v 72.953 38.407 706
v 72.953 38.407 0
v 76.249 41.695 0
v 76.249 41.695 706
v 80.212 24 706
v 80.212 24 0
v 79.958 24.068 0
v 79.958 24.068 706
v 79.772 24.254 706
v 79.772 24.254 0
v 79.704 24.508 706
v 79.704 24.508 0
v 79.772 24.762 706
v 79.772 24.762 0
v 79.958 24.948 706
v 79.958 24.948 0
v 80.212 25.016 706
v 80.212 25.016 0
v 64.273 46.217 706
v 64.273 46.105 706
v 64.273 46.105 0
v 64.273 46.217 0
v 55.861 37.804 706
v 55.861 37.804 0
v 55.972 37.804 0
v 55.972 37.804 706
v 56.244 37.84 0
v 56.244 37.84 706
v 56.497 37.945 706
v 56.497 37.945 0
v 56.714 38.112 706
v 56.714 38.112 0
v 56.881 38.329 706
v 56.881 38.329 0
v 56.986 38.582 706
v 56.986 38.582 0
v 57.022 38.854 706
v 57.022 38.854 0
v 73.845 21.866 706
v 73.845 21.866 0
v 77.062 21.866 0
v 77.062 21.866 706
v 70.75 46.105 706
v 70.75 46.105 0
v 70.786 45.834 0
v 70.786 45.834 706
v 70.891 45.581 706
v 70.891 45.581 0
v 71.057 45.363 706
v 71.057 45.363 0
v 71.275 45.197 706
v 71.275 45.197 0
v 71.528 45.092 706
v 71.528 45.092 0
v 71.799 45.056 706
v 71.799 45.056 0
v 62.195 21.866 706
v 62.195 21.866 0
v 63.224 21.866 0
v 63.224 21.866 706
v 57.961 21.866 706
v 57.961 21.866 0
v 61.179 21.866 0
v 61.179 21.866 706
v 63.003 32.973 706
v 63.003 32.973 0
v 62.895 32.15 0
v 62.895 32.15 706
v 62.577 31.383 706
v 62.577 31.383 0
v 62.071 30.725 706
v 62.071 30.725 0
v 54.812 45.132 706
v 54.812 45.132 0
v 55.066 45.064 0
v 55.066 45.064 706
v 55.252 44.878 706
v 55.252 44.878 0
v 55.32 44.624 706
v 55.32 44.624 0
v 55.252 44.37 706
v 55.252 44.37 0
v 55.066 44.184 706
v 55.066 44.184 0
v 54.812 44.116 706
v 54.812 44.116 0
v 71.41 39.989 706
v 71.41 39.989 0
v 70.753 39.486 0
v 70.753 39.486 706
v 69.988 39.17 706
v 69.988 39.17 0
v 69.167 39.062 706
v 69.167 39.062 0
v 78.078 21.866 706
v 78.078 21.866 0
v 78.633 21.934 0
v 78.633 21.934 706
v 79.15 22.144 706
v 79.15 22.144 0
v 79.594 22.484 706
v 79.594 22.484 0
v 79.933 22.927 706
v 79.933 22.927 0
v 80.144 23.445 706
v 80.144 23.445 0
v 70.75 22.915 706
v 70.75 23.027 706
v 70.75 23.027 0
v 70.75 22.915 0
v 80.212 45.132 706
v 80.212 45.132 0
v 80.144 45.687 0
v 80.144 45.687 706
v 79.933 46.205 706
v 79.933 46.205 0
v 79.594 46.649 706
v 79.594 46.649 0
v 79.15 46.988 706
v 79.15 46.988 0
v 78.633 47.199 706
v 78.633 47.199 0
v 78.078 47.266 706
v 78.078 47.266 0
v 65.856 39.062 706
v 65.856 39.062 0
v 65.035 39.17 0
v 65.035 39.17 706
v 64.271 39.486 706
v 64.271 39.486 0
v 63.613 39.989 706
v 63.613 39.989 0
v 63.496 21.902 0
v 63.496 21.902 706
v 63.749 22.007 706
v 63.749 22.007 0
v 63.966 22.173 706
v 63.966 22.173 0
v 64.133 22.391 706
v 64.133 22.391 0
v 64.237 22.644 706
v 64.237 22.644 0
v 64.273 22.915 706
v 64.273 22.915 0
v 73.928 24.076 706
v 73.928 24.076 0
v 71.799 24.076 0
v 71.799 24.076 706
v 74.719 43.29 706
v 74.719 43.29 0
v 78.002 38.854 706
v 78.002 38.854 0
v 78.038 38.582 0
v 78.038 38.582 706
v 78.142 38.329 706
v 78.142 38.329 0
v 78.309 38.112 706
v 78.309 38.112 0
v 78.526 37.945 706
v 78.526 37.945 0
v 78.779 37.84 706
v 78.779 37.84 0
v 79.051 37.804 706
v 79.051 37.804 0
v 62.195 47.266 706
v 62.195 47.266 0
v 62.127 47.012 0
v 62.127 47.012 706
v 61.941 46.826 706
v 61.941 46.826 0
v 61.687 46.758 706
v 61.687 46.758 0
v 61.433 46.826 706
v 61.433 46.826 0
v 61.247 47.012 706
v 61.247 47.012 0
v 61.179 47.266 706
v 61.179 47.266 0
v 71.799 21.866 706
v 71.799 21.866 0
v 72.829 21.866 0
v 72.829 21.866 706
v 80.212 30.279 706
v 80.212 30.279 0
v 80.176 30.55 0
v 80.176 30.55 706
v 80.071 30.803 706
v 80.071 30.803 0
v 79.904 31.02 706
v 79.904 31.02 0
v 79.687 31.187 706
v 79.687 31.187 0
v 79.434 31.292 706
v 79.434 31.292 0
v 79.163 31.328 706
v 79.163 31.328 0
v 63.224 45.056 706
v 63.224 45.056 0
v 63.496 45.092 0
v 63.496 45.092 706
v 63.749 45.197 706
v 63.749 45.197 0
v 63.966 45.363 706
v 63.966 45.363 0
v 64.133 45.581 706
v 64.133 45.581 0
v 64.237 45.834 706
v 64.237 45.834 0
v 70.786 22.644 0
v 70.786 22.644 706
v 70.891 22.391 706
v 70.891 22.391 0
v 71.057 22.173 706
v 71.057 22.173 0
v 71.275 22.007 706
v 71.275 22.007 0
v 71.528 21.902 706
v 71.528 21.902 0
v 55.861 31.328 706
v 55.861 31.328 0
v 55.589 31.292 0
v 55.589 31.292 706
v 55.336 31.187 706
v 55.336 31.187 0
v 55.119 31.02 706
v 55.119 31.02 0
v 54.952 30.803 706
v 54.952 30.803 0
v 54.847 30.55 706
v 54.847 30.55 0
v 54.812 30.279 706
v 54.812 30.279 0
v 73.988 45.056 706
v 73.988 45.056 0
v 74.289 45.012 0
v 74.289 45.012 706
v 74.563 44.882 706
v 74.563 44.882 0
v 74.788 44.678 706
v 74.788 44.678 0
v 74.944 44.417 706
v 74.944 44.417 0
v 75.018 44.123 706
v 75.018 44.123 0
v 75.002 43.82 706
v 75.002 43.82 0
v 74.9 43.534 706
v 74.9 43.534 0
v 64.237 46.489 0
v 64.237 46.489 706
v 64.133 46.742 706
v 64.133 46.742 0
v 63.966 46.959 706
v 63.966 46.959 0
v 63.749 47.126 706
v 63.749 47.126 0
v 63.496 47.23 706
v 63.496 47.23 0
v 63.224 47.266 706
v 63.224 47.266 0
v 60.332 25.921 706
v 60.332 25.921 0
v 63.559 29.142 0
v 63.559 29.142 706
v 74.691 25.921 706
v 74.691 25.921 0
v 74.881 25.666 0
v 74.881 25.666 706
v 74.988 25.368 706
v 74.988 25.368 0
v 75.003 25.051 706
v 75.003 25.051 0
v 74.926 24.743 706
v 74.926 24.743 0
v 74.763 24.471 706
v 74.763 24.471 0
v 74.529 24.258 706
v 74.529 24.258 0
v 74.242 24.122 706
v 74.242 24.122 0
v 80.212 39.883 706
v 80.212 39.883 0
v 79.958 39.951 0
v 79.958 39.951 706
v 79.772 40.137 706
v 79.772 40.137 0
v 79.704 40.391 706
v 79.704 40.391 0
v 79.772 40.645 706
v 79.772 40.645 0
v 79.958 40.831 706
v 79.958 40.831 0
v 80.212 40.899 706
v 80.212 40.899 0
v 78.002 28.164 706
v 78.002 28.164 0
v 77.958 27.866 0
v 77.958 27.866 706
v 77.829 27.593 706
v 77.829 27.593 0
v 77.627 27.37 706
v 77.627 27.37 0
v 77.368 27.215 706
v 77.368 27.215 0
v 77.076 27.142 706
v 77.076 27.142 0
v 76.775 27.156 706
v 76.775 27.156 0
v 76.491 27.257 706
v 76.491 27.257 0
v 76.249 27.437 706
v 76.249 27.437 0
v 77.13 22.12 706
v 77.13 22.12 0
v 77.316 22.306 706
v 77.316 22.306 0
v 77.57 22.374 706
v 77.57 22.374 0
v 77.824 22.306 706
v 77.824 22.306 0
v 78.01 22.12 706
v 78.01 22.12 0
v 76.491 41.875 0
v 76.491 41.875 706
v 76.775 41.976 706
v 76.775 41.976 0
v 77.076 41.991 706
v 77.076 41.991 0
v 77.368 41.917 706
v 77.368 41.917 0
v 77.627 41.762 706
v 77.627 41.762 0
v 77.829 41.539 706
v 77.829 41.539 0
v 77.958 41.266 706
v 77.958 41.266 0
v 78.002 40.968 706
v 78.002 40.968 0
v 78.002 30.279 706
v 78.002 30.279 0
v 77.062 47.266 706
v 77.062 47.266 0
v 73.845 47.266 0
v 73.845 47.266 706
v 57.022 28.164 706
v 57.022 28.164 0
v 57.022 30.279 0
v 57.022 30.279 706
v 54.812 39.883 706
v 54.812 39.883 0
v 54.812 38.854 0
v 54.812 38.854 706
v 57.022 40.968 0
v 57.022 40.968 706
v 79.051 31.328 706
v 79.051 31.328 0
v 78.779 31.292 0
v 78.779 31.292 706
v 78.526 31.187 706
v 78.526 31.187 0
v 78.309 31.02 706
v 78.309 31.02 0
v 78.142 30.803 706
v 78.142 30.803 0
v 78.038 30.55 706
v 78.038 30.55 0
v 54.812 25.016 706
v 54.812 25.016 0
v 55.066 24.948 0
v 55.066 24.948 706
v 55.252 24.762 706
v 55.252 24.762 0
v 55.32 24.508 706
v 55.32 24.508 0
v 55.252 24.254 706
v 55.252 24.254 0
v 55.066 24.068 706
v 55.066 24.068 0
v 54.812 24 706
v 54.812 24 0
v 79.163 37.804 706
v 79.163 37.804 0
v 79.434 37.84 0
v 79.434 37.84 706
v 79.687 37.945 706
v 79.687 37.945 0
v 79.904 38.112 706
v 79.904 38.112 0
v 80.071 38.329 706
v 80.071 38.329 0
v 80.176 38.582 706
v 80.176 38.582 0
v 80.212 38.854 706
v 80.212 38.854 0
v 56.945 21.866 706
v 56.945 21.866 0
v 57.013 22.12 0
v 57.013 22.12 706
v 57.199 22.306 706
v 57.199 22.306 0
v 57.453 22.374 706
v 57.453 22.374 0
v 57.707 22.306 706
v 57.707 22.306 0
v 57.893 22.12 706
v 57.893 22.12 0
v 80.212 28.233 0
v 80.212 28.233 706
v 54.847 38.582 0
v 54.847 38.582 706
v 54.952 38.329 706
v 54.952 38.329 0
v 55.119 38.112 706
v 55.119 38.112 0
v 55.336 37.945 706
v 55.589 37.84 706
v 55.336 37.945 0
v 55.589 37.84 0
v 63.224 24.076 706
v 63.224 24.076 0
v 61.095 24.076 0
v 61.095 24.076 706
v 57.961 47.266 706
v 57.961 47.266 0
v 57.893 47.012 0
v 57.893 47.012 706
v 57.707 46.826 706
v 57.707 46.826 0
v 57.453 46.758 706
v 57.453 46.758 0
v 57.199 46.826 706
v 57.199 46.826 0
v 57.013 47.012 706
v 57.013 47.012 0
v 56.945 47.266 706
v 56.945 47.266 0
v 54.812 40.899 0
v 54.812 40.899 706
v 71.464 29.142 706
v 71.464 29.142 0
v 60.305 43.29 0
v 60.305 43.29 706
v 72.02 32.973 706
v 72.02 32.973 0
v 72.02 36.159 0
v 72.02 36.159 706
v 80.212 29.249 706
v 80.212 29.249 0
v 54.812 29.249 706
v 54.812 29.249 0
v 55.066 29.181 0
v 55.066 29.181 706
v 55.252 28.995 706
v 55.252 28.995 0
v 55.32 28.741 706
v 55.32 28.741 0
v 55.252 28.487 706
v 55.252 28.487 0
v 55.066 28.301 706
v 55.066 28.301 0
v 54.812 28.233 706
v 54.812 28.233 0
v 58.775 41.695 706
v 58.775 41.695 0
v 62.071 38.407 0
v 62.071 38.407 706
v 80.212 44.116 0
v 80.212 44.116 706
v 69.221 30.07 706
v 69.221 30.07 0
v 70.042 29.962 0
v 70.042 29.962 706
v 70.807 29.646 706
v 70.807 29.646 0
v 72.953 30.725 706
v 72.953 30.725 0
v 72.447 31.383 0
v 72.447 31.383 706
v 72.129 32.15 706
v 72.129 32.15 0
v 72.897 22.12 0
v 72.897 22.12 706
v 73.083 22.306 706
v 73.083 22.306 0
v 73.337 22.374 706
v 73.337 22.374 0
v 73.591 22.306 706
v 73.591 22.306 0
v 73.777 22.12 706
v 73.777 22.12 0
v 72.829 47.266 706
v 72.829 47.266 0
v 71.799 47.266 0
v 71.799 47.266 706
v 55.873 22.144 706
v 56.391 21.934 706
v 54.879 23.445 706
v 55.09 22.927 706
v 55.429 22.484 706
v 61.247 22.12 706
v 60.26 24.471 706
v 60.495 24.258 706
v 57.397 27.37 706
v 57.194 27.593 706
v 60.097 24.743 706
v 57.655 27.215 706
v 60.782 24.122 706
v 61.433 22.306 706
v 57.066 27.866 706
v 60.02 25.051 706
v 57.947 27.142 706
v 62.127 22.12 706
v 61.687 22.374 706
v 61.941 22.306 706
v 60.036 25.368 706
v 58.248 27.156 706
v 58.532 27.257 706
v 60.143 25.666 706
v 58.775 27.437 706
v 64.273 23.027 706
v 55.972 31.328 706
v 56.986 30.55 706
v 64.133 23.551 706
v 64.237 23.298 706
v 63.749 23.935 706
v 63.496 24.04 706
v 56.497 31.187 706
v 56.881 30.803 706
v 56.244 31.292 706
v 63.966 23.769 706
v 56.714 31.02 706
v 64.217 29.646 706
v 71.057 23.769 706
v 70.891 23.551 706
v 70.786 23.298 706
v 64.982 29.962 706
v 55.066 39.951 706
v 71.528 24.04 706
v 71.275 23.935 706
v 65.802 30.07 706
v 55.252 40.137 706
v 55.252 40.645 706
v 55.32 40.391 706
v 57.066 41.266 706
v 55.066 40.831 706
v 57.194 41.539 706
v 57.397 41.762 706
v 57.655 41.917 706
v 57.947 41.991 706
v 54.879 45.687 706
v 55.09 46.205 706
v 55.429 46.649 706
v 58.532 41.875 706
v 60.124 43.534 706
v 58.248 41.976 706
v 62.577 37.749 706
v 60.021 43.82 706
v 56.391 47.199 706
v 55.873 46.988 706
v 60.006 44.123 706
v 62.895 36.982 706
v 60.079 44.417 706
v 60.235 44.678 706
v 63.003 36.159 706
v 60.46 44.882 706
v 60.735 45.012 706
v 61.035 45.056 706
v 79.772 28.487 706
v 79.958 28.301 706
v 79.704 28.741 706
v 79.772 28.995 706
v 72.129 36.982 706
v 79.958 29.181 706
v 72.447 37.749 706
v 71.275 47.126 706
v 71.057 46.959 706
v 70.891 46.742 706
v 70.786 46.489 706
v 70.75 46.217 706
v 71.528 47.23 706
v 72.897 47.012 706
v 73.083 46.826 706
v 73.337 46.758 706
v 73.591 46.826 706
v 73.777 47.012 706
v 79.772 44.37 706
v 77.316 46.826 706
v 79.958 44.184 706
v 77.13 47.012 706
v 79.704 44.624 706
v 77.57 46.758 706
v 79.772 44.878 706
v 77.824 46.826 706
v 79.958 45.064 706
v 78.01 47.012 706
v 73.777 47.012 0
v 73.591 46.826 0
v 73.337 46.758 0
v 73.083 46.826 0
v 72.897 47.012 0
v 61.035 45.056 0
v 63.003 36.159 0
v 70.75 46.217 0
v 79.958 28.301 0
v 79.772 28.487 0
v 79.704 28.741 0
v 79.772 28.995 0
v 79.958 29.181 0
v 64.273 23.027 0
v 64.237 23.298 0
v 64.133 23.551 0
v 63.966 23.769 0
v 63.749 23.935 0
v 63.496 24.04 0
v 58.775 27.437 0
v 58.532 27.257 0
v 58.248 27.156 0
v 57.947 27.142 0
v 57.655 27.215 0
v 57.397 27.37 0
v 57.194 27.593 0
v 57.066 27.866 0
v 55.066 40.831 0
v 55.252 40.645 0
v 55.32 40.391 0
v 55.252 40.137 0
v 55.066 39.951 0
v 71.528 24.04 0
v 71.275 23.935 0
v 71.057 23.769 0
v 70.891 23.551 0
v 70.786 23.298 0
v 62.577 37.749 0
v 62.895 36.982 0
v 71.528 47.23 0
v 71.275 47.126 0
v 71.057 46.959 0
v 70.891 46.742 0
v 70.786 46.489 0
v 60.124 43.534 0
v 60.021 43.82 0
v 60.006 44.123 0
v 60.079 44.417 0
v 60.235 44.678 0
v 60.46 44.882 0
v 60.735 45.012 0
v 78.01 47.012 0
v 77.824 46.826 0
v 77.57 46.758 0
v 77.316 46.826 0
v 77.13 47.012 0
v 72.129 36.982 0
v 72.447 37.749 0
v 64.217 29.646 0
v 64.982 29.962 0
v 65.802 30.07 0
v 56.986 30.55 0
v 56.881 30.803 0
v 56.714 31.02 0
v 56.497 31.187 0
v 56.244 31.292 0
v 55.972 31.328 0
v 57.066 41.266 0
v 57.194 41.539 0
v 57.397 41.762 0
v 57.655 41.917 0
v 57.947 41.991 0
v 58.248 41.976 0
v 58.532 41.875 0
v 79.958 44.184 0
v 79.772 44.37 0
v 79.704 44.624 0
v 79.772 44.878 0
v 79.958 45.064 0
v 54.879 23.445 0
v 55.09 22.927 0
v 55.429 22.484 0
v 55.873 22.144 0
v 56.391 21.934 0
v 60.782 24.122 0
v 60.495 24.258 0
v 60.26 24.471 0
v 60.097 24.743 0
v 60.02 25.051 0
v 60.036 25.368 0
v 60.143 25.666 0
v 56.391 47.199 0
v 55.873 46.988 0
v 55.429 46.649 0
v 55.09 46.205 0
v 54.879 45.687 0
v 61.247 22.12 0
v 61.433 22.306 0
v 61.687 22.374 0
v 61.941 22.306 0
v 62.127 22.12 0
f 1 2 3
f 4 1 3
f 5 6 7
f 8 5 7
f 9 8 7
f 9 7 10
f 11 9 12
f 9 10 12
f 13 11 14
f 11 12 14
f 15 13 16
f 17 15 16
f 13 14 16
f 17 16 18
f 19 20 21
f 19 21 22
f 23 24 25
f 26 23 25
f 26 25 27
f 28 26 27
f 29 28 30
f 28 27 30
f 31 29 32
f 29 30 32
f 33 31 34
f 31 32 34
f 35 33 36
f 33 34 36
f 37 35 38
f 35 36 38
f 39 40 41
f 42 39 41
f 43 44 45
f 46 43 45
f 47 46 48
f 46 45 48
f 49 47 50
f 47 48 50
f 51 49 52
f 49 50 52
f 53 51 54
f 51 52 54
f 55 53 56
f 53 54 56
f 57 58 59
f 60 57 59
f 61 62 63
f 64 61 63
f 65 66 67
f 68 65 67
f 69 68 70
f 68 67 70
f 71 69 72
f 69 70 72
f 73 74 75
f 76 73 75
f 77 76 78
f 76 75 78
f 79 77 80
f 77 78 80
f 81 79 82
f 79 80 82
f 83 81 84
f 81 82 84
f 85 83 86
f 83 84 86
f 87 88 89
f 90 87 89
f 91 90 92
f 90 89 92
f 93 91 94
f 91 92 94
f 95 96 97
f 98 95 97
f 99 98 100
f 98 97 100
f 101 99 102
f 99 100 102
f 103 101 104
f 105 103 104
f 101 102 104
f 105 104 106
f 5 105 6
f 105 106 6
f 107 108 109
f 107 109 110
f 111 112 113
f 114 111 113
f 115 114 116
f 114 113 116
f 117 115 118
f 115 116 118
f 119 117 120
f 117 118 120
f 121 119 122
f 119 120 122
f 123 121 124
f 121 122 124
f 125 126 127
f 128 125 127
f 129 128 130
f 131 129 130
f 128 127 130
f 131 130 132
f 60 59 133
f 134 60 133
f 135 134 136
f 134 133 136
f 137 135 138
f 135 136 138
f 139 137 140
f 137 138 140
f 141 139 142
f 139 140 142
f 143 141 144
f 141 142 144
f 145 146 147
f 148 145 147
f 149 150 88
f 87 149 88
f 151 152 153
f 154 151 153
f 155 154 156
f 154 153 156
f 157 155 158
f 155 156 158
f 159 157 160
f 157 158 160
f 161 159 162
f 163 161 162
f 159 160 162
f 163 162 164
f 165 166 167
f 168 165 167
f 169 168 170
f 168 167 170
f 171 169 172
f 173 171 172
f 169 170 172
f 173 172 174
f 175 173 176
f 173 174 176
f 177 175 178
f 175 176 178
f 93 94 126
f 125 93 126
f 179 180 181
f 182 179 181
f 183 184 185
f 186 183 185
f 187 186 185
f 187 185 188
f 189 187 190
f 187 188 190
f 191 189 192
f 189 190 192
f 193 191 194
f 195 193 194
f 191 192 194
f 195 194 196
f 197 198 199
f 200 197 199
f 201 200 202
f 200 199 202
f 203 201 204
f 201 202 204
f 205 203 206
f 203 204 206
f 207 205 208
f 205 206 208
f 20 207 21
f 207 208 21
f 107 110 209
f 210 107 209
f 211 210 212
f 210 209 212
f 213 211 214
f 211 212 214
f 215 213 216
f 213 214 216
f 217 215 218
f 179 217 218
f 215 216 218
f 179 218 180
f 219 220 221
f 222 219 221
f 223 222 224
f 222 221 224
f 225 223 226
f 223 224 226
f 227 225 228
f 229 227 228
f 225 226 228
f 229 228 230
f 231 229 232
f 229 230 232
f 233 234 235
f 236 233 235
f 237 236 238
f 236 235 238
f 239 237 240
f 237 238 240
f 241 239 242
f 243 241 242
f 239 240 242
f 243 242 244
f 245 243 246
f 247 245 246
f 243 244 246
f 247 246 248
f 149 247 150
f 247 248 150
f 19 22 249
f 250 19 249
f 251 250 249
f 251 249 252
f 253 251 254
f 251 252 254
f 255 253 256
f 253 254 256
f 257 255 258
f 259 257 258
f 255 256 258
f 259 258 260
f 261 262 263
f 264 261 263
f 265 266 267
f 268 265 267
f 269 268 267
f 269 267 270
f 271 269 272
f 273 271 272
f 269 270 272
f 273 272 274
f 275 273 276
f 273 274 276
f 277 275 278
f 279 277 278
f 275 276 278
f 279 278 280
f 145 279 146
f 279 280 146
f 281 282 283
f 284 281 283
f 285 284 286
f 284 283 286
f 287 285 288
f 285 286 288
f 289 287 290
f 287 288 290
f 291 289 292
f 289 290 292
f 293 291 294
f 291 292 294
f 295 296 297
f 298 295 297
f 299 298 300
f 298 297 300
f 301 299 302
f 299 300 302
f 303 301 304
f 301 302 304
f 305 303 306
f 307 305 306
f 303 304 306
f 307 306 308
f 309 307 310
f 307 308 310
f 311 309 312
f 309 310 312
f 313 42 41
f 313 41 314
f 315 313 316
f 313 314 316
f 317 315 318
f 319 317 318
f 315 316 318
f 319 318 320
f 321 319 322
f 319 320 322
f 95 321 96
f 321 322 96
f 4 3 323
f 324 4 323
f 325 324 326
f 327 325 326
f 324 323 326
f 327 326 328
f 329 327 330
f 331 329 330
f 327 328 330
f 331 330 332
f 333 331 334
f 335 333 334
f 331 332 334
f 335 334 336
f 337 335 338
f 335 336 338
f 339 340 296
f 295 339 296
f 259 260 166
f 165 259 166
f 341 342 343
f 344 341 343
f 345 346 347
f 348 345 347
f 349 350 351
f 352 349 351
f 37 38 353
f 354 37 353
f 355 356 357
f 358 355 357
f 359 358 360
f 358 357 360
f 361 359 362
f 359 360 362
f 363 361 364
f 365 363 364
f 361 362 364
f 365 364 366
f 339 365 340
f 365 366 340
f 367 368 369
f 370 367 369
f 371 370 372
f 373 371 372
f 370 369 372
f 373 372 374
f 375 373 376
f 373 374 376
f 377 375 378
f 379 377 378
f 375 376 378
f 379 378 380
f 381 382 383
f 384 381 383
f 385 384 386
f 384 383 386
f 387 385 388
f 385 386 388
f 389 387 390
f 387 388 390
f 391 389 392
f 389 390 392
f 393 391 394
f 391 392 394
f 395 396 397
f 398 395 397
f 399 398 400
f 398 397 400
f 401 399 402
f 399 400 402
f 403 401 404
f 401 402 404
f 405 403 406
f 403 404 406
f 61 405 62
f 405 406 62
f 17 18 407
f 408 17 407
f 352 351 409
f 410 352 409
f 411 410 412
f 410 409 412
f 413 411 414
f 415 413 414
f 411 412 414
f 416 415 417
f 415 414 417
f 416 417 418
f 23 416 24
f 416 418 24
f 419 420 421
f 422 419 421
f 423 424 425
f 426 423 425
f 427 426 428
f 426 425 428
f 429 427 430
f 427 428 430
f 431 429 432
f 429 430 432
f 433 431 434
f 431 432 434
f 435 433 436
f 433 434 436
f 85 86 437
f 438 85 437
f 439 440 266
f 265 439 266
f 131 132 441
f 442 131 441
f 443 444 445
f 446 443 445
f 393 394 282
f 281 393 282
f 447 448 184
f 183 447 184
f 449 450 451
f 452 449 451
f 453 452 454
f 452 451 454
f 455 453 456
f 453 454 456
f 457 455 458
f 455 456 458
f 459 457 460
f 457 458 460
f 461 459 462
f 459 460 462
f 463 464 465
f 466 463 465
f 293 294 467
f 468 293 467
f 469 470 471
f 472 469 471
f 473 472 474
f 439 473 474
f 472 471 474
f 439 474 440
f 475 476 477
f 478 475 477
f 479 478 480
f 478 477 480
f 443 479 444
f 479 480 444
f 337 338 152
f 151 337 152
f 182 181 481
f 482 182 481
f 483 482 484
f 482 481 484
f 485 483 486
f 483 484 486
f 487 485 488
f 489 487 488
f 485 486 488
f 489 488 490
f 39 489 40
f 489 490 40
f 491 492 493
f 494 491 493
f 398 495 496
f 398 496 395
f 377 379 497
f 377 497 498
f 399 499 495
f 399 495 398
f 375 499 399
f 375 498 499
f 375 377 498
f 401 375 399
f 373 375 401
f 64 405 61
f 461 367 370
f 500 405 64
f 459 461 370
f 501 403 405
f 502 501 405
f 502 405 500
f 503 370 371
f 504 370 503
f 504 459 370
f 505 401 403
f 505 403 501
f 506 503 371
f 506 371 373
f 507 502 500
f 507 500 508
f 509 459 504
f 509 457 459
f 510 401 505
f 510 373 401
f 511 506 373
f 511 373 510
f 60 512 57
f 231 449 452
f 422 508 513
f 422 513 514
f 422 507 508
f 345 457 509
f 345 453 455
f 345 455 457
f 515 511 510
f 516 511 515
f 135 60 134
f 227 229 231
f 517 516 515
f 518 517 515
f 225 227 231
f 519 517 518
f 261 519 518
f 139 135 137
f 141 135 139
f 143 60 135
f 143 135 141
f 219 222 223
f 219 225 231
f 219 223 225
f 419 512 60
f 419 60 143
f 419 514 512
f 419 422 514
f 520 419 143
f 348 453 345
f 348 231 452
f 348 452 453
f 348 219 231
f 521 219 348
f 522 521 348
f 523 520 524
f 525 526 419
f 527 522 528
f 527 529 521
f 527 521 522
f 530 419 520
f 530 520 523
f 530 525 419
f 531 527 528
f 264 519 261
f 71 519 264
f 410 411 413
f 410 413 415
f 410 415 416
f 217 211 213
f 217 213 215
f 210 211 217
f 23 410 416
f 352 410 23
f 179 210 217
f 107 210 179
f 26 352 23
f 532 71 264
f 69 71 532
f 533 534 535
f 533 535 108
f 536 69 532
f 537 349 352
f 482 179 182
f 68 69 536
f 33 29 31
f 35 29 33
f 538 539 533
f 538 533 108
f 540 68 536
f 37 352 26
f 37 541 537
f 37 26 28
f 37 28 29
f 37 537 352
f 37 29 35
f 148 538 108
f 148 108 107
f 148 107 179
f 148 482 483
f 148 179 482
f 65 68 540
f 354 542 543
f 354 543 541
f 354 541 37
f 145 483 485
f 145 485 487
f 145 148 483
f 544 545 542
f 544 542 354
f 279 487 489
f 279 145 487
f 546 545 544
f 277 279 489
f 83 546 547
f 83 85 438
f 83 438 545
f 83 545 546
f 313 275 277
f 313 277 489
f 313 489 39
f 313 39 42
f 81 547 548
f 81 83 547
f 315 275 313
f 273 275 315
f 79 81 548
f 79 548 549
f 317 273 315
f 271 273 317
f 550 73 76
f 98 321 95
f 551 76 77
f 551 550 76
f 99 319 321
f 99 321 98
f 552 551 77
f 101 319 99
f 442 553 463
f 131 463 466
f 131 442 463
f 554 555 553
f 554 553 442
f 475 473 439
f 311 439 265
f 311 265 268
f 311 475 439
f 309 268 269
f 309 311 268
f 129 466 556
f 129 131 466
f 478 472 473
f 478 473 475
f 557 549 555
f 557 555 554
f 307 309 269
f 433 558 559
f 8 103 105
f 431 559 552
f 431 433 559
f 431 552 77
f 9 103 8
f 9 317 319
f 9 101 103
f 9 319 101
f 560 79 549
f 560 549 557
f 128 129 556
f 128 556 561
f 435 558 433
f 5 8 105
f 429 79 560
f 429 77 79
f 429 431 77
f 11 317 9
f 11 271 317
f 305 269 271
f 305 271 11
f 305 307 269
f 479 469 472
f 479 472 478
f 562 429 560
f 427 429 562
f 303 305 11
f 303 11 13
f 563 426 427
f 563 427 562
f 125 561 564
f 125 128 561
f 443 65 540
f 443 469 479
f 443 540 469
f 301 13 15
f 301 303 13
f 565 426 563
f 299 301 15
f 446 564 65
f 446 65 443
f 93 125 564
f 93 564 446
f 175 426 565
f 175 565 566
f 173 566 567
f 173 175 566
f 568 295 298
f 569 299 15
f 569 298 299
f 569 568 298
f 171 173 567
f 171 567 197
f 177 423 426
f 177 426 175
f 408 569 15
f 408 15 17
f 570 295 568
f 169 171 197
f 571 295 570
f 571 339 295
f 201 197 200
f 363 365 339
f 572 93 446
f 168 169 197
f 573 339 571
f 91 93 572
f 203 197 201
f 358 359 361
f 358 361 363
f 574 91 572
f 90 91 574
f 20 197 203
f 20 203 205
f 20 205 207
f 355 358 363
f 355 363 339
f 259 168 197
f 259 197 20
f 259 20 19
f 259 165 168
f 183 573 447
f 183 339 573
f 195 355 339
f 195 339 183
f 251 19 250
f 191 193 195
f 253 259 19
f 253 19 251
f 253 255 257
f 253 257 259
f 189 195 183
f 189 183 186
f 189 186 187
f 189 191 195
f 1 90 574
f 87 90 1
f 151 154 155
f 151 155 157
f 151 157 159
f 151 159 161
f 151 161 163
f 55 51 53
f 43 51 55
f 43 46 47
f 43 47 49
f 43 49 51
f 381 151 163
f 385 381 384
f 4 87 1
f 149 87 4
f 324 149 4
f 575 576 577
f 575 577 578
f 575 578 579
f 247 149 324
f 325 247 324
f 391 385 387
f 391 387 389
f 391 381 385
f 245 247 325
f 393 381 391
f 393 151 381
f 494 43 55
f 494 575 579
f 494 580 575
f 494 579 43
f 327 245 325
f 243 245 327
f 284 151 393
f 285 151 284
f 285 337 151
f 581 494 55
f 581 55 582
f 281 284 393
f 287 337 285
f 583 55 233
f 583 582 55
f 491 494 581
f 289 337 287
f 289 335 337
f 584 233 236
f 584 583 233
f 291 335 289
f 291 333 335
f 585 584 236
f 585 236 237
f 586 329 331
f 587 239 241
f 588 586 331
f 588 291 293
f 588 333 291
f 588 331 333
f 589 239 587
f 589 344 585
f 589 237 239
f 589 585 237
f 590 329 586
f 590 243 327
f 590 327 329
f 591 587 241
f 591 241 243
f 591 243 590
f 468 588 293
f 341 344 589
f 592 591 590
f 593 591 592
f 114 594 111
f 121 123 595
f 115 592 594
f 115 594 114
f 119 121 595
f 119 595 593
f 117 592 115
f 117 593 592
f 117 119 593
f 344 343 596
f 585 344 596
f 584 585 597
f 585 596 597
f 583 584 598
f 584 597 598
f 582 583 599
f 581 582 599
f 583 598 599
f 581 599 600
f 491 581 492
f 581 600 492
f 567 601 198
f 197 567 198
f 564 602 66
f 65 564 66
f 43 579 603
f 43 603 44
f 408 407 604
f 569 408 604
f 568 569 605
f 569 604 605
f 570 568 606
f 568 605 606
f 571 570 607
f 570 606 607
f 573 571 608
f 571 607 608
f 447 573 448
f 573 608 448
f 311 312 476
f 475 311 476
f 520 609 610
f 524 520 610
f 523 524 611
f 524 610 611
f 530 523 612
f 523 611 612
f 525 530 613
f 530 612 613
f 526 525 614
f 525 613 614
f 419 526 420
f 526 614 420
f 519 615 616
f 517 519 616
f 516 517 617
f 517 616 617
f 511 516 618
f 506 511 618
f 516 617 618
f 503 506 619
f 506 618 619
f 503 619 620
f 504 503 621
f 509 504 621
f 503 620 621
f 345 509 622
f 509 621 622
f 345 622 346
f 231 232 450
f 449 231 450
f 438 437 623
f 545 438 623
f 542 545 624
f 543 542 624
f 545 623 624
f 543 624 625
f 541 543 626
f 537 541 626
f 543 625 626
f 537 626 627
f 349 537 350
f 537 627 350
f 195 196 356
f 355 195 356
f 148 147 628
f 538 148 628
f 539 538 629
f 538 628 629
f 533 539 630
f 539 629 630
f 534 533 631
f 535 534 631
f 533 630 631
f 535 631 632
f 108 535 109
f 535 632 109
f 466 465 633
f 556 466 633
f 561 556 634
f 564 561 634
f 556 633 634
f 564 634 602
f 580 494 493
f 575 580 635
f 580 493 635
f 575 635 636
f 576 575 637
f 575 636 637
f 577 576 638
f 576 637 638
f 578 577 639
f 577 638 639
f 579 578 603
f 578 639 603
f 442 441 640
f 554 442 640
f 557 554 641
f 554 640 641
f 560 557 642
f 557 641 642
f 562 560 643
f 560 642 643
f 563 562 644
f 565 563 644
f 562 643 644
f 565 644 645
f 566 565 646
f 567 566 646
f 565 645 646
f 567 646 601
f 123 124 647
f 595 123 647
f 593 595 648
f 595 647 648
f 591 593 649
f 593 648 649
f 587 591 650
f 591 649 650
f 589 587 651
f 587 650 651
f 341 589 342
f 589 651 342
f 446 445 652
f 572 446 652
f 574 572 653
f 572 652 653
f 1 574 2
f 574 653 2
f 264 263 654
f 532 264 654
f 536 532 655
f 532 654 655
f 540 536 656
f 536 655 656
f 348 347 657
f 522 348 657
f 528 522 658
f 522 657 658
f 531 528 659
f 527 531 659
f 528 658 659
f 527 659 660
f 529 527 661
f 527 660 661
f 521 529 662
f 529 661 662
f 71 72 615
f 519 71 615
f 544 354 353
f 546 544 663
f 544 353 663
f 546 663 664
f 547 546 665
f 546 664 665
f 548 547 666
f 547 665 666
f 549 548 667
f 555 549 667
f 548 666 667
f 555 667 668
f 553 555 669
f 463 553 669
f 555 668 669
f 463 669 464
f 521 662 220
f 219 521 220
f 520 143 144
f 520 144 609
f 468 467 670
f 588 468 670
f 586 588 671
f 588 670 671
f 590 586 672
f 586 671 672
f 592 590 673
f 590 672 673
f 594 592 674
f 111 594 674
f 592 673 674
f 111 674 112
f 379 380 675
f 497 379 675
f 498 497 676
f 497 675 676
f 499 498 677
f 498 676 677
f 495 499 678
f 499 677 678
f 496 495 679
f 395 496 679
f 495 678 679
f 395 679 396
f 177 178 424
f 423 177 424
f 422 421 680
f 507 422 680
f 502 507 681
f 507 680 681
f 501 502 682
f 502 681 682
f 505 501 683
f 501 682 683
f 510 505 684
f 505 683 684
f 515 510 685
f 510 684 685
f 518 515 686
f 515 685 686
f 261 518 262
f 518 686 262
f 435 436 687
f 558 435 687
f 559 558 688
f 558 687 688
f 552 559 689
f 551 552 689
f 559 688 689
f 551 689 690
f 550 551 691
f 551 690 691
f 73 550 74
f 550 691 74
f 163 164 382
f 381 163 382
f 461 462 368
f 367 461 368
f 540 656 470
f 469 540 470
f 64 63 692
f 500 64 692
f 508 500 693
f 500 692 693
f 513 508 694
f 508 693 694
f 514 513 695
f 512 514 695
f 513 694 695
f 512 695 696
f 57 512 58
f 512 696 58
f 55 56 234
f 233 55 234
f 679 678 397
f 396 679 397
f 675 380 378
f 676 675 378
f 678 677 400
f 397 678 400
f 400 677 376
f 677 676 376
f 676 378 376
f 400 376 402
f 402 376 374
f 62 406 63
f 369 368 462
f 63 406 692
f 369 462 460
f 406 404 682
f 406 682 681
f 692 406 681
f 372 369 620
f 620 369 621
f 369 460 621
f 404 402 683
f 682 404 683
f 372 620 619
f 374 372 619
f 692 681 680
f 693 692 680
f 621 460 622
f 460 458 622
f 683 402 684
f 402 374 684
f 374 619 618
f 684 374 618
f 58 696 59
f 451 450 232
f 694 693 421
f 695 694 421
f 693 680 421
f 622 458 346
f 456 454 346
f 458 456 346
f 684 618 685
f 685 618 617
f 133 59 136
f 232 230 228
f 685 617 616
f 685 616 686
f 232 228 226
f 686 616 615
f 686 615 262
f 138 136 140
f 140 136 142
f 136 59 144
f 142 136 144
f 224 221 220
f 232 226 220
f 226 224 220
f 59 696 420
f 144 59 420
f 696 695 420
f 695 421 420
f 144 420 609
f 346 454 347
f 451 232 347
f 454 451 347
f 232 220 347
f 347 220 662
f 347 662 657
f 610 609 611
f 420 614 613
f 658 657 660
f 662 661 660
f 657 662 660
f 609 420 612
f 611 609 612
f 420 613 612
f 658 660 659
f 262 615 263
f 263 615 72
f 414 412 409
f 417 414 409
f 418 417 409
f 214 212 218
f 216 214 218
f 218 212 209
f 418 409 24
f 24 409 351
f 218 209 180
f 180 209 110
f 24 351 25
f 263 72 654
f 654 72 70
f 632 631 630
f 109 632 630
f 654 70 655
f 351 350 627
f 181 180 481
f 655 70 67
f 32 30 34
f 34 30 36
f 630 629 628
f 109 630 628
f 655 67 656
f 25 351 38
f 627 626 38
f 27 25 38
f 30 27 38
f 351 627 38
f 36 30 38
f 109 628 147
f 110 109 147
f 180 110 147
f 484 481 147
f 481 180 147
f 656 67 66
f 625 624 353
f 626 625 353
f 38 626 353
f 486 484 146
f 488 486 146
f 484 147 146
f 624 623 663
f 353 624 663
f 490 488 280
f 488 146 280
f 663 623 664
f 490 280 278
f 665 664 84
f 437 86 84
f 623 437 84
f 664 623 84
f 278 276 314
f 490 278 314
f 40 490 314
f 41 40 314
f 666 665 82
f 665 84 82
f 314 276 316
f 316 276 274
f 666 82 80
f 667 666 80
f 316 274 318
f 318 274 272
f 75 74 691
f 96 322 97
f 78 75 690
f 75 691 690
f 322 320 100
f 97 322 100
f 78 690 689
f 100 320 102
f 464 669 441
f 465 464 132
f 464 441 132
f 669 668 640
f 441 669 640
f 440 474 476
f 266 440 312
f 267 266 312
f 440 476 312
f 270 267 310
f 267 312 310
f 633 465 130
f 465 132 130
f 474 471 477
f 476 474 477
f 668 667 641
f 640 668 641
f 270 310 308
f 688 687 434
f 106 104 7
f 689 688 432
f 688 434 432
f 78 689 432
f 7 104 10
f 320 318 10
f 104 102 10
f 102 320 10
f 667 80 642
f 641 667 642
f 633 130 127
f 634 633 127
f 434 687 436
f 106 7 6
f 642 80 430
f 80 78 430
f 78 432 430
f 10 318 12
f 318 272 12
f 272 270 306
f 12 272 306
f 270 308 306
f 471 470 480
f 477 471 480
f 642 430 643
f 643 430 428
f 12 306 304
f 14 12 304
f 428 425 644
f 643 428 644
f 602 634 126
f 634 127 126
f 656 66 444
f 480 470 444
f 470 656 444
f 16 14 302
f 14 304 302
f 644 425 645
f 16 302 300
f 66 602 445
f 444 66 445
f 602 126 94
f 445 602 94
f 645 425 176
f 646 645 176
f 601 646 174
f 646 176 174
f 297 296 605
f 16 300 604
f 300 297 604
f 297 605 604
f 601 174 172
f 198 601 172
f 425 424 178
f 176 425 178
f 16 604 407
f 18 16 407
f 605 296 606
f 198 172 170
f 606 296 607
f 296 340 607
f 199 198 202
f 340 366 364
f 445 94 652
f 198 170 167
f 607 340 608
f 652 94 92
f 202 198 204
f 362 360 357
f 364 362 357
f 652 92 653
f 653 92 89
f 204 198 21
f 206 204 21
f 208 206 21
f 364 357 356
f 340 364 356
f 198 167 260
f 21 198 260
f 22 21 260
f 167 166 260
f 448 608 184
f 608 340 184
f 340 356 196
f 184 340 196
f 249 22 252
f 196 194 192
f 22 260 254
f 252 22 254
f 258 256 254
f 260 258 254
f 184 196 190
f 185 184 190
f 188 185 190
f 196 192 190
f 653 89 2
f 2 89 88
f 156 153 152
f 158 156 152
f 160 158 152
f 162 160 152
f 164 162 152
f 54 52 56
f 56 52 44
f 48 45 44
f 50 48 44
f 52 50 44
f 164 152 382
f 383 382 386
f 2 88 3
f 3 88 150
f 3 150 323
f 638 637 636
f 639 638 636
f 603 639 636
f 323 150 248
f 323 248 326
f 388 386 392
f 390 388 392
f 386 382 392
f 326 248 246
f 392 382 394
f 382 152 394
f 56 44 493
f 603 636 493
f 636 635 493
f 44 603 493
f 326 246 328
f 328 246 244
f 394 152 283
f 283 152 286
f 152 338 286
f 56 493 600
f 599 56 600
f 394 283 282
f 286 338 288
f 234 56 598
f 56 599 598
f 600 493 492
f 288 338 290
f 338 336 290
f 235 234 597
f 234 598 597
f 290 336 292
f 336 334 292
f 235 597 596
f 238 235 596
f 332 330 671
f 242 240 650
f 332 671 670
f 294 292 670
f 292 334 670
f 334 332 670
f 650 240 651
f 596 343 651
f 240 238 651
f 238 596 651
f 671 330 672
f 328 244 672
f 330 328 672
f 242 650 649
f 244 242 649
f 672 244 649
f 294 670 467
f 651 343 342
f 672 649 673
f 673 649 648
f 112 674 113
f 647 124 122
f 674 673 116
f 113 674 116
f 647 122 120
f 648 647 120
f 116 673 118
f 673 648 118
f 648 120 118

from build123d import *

# Parameters (mm, degrees)
F1_DEPTH = 706


with BuildPart() as f1:
    # F0 (on Top) → F1 (new body)
    with BuildSketch(Plane.XY):
        with BuildLine():
            ThreePointArc((57.021511, 40.96813), (57.655206, 41.917109), (58.77458, 41.69545))
            Line((58.77458, 41.69545), (62.070705, 38.406858))
            ThreePointArc((62.070705, 38.406858), (62.760833, 37.375924), (63.003211, 36.159227))
            Line((63.003211, 36.159227), (63.003211, 32.972856))
            ThreePointArc((63.003211, 32.972856), (62.760833, 31.756158), (62.070705, 30.725225))
            Line((62.070705, 30.725225), (58.77458, 27.436632))
            ThreePointArc((58.77458, 27.436632), (57.655206, 27.214973), (57.021511, 28.163952))
            Line((57.021511, 28.163952), (57.021511, 30.278572))
            ThreePointArc((57.021511, 30.278572), (56.714262, 31.020336), (55.972499, 31.327584))
            Line((55.972499, 31.327584), (55.860723, 31.327584))
            ThreePointArc((55.860723, 31.327584), (55.11896, 31.020336), (54.811711, 30.278572))
            Line((54.811711, 30.278572), (54.811711, 29.248958))
            ThreePointArc((54.811711, 29.248958), (55.319711, 28.740958), (54.811711, 28.232958))
            Line((54.811711, 28.232958), (54.811711, 25.015641))
            ThreePointArc((54.811711, 25.015641), (55.319788, 24.507718), (54.811864, 23.999641))
            ThreePointArc((54.811864, 23.999641), (55.429173, 22.483534), (56.945268, 21.866194))
            ThreePointArc((56.945268, 21.866194), (57.453344, 22.374118), (57.961268, 21.866041))
            Line((57.961268, 21.866041), (61.178584, 21.866041))
            ThreePointArc((61.178584, 21.866041), (61.686584, 22.374041), (62.194584, 21.866041))
            Line((62.194584, 21.866041), (63.224199, 21.866041))
            ThreePointArc((63.224199, 21.866041), (63.965962, 22.17329), (64.273211, 22.915054))
            Line((64.273211, 22.915054), (64.273211, 23.026829))
            ThreePointArc((64.273211, 23.026829), (63.965962, 23.768593), (63.224199, 24.075841))
            Line((63.224199, 24.075841), (61.095303, 24.075841))
            ThreePointArc((61.095303, 24.075841), (60.09698, 24.743228), (60.332061, 25.920849))
            Line((60.332061, 25.920849), (63.559441, 29.142351))
            ThreePointArc((63.559441, 29.142351), (64.588775, 29.829112), (65.802458, 30.070241))
            Line((65.802458, 30.070241), (69.220965, 30.070241))
            ThreePointArc((69.220965, 30.070241), (70.434648, 29.829112), (71.463981, 29.142351))
            Line((71.463981, 29.142351), (74.691362, 25.920849))
            ThreePointArc((74.691362, 25.920849), (74.926442, 24.743228), (73.928119, 24.075841))
            Line((73.928119, 24.075841), (71.799223, 24.075841))
            ThreePointArc((71.799223, 24.075841), (71.05746, 23.768593), (70.750211, 23.026829))
            Line((70.750211, 23.026829), (70.750211, 22.915054))
            ThreePointArc((70.750211, 22.915054), (71.05746, 22.17329), (71.799223, 21.866041))
            Line((71.799223, 21.866041), (72.828838, 21.866041))
            ThreePointArc((72.828838, 21.866041), (73.336838, 22.374041), (73.844838, 21.866041))
            Line((73.844838, 21.866041), (77.062154, 21.866041))
            ThreePointArc((77.062154, 21.866041), (77.570078, 22.374118), (78.078154, 21.866194))
            ThreePointArc((78.078154, 21.866194), (79.594249, 22.483534), (80.211558, 23.999641))
            ThreePointArc((80.211558, 23.999641), (79.703635, 24.507718), (80.211711, 25.015641))
            Line((80.211711, 25.015641), (80.211711, 28.232958))
            ThreePointArc((80.211711, 28.232958), (79.703711, 28.740958), (80.211711, 29.248958))
            Line((80.211711, 29.248958), (80.211711, 30.278572))
            ThreePointArc((80.211711, 30.278572), (79.904462, 31.020336), (79.162699, 31.327584))
            Line((79.162699, 31.327584), (79.050923, 31.327584))
            ThreePointArc((79.050923, 31.327584), (78.30916, 31.020336), (78.001911, 30.278572))
            Line((78.001911, 30.278572), (78.001911, 28.163952))
            ThreePointArc((78.001911, 28.163952), (77.368216, 27.214973), (76.248842, 27.436632))
            Line((76.248842, 27.436632), (72.952717, 30.725225))
            ThreePointArc((72.952717, 30.725225), (72.262589, 31.756158), (72.020211, 32.972856))
            Line((72.020211, 32.972856), (72.020211, 36.159227))
            ThreePointArc((72.020211, 36.159227), (72.262589, 37.375924), (72.952717, 38.406858))
            Line((72.952717, 38.406858), (76.248842, 41.69545))
            ThreePointArc((76.248842, 41.69545), (77.368216, 41.917109), (78.001911, 40.96813))
            Line((78.001911, 40.96813), (78.001911, 38.853511))
            ThreePointArc((78.001911, 38.853511), (78.30916, 38.111747), (79.050923, 37.804498))
            Line((79.050923, 37.804498), (79.162699, 37.804498))
            ThreePointArc((79.162699, 37.804498), (79.904462, 38.111747), (80.211711, 38.853511))
            Line((80.211711, 38.853511), (80.211711, 39.883125))
            ThreePointArc((80.211711, 39.883125), (79.703711, 40.391125), (80.211711, 40.899125))
            Line((80.211711, 40.899125), (80.211711, 44.116441))
            ThreePointArc((80.211711, 44.116441), (79.703635, 44.624365), (80.211558, 45.132441))
            ThreePointArc((80.211558, 45.132441), (79.594249, 46.648549), (78.078154, 47.265889))
            ThreePointArc((78.078154, 47.265889), (77.570078, 46.757965), (77.062154, 47.266041))
            Line((77.062154, 47.266041), (73.844838, 47.266041))
            ThreePointArc((73.844838, 47.266041), (73.336838, 46.758041), (72.828838, 47.266041))
            Line((72.828838, 47.266041), (71.799223, 47.266041))
            ThreePointArc((71.799223, 47.266041), (71.05746, 46.958793), (70.750211, 46.217029))
            Line((70.750211, 46.217029), (70.750211, 46.105254))
            ThreePointArc((70.750211, 46.105254), (71.05746, 45.36349), (71.799223, 45.056241))
            Line((71.799223, 45.056241), (73.9885, 45.056241))
            ThreePointArc((73.9885, 45.056241), (74.943933, 44.417446), (74.718747, 43.290412))
            Line((74.718747, 43.290412), (71.409984, 39.98921))
            ThreePointArc((71.409984, 39.98921), (70.380831, 39.302829), (69.167489, 39.061841))
            Line((69.167489, 39.061841), (65.855933, 39.061841))
            ThreePointArc((65.855933, 39.061841), (64.642591, 39.302829), (63.613439, 39.98921))
            Line((63.613439, 39.98921), (60.304675, 43.290412))
            ThreePointArc((60.304675, 43.290412), (60.079489, 44.417446), (61.034922, 45.056241))
            Line((61.034922, 45.056241), (63.224199, 45.056241))
            ThreePointArc((63.224199, 45.056241), (63.965962, 45.36349), (64.273211, 46.105254))
            Line((64.273211, 46.105254), (64.273211, 46.217029))
            ThreePointArc((64.273211, 46.217029), (63.965962, 46.958793), (63.224199, 47.266041))
            Line((63.224199, 47.266041), (62.194584, 47.266041))
            ThreePointArc((62.194584, 47.266041), (61.686584, 46.758041), (61.178584, 47.266041))
            Line((61.178584, 47.266041), (57.961268, 47.266041))
            ThreePointArc((57.961268, 47.266041), (57.453344, 46.757965), (56.945268, 47.265889))
            ThreePointArc((56.945268, 47.265889), (55.429173, 46.648549), (54.811864, 45.132441))
            ThreePointArc((54.811864, 45.132441), (55.319788, 44.624365), (54.811711, 44.116441))
            Line((54.811711, 44.116441), (54.811711, 40.899125))
            ThreePointArc((54.811711, 40.899125), (55.319711, 40.391125), (54.811711, 39.883125))
            Line((54.811711, 39.883125), (54.811711, 38.853511))
            ThreePointArc((54.811711, 38.853511), (55.11896, 38.111747), (55.860723, 37.804498))
            Line((55.860723, 37.804498), (55.972499, 37.804498))
            ThreePointArc((55.972499, 37.804498), (56.714262, 38.111747), (57.021511, 38.853511))
            Line((57.021511, 38.853511), (57.021511, 40.96813))
        make_face()
    extrude(amount=F1_DEPTH)


solid = f1.part
